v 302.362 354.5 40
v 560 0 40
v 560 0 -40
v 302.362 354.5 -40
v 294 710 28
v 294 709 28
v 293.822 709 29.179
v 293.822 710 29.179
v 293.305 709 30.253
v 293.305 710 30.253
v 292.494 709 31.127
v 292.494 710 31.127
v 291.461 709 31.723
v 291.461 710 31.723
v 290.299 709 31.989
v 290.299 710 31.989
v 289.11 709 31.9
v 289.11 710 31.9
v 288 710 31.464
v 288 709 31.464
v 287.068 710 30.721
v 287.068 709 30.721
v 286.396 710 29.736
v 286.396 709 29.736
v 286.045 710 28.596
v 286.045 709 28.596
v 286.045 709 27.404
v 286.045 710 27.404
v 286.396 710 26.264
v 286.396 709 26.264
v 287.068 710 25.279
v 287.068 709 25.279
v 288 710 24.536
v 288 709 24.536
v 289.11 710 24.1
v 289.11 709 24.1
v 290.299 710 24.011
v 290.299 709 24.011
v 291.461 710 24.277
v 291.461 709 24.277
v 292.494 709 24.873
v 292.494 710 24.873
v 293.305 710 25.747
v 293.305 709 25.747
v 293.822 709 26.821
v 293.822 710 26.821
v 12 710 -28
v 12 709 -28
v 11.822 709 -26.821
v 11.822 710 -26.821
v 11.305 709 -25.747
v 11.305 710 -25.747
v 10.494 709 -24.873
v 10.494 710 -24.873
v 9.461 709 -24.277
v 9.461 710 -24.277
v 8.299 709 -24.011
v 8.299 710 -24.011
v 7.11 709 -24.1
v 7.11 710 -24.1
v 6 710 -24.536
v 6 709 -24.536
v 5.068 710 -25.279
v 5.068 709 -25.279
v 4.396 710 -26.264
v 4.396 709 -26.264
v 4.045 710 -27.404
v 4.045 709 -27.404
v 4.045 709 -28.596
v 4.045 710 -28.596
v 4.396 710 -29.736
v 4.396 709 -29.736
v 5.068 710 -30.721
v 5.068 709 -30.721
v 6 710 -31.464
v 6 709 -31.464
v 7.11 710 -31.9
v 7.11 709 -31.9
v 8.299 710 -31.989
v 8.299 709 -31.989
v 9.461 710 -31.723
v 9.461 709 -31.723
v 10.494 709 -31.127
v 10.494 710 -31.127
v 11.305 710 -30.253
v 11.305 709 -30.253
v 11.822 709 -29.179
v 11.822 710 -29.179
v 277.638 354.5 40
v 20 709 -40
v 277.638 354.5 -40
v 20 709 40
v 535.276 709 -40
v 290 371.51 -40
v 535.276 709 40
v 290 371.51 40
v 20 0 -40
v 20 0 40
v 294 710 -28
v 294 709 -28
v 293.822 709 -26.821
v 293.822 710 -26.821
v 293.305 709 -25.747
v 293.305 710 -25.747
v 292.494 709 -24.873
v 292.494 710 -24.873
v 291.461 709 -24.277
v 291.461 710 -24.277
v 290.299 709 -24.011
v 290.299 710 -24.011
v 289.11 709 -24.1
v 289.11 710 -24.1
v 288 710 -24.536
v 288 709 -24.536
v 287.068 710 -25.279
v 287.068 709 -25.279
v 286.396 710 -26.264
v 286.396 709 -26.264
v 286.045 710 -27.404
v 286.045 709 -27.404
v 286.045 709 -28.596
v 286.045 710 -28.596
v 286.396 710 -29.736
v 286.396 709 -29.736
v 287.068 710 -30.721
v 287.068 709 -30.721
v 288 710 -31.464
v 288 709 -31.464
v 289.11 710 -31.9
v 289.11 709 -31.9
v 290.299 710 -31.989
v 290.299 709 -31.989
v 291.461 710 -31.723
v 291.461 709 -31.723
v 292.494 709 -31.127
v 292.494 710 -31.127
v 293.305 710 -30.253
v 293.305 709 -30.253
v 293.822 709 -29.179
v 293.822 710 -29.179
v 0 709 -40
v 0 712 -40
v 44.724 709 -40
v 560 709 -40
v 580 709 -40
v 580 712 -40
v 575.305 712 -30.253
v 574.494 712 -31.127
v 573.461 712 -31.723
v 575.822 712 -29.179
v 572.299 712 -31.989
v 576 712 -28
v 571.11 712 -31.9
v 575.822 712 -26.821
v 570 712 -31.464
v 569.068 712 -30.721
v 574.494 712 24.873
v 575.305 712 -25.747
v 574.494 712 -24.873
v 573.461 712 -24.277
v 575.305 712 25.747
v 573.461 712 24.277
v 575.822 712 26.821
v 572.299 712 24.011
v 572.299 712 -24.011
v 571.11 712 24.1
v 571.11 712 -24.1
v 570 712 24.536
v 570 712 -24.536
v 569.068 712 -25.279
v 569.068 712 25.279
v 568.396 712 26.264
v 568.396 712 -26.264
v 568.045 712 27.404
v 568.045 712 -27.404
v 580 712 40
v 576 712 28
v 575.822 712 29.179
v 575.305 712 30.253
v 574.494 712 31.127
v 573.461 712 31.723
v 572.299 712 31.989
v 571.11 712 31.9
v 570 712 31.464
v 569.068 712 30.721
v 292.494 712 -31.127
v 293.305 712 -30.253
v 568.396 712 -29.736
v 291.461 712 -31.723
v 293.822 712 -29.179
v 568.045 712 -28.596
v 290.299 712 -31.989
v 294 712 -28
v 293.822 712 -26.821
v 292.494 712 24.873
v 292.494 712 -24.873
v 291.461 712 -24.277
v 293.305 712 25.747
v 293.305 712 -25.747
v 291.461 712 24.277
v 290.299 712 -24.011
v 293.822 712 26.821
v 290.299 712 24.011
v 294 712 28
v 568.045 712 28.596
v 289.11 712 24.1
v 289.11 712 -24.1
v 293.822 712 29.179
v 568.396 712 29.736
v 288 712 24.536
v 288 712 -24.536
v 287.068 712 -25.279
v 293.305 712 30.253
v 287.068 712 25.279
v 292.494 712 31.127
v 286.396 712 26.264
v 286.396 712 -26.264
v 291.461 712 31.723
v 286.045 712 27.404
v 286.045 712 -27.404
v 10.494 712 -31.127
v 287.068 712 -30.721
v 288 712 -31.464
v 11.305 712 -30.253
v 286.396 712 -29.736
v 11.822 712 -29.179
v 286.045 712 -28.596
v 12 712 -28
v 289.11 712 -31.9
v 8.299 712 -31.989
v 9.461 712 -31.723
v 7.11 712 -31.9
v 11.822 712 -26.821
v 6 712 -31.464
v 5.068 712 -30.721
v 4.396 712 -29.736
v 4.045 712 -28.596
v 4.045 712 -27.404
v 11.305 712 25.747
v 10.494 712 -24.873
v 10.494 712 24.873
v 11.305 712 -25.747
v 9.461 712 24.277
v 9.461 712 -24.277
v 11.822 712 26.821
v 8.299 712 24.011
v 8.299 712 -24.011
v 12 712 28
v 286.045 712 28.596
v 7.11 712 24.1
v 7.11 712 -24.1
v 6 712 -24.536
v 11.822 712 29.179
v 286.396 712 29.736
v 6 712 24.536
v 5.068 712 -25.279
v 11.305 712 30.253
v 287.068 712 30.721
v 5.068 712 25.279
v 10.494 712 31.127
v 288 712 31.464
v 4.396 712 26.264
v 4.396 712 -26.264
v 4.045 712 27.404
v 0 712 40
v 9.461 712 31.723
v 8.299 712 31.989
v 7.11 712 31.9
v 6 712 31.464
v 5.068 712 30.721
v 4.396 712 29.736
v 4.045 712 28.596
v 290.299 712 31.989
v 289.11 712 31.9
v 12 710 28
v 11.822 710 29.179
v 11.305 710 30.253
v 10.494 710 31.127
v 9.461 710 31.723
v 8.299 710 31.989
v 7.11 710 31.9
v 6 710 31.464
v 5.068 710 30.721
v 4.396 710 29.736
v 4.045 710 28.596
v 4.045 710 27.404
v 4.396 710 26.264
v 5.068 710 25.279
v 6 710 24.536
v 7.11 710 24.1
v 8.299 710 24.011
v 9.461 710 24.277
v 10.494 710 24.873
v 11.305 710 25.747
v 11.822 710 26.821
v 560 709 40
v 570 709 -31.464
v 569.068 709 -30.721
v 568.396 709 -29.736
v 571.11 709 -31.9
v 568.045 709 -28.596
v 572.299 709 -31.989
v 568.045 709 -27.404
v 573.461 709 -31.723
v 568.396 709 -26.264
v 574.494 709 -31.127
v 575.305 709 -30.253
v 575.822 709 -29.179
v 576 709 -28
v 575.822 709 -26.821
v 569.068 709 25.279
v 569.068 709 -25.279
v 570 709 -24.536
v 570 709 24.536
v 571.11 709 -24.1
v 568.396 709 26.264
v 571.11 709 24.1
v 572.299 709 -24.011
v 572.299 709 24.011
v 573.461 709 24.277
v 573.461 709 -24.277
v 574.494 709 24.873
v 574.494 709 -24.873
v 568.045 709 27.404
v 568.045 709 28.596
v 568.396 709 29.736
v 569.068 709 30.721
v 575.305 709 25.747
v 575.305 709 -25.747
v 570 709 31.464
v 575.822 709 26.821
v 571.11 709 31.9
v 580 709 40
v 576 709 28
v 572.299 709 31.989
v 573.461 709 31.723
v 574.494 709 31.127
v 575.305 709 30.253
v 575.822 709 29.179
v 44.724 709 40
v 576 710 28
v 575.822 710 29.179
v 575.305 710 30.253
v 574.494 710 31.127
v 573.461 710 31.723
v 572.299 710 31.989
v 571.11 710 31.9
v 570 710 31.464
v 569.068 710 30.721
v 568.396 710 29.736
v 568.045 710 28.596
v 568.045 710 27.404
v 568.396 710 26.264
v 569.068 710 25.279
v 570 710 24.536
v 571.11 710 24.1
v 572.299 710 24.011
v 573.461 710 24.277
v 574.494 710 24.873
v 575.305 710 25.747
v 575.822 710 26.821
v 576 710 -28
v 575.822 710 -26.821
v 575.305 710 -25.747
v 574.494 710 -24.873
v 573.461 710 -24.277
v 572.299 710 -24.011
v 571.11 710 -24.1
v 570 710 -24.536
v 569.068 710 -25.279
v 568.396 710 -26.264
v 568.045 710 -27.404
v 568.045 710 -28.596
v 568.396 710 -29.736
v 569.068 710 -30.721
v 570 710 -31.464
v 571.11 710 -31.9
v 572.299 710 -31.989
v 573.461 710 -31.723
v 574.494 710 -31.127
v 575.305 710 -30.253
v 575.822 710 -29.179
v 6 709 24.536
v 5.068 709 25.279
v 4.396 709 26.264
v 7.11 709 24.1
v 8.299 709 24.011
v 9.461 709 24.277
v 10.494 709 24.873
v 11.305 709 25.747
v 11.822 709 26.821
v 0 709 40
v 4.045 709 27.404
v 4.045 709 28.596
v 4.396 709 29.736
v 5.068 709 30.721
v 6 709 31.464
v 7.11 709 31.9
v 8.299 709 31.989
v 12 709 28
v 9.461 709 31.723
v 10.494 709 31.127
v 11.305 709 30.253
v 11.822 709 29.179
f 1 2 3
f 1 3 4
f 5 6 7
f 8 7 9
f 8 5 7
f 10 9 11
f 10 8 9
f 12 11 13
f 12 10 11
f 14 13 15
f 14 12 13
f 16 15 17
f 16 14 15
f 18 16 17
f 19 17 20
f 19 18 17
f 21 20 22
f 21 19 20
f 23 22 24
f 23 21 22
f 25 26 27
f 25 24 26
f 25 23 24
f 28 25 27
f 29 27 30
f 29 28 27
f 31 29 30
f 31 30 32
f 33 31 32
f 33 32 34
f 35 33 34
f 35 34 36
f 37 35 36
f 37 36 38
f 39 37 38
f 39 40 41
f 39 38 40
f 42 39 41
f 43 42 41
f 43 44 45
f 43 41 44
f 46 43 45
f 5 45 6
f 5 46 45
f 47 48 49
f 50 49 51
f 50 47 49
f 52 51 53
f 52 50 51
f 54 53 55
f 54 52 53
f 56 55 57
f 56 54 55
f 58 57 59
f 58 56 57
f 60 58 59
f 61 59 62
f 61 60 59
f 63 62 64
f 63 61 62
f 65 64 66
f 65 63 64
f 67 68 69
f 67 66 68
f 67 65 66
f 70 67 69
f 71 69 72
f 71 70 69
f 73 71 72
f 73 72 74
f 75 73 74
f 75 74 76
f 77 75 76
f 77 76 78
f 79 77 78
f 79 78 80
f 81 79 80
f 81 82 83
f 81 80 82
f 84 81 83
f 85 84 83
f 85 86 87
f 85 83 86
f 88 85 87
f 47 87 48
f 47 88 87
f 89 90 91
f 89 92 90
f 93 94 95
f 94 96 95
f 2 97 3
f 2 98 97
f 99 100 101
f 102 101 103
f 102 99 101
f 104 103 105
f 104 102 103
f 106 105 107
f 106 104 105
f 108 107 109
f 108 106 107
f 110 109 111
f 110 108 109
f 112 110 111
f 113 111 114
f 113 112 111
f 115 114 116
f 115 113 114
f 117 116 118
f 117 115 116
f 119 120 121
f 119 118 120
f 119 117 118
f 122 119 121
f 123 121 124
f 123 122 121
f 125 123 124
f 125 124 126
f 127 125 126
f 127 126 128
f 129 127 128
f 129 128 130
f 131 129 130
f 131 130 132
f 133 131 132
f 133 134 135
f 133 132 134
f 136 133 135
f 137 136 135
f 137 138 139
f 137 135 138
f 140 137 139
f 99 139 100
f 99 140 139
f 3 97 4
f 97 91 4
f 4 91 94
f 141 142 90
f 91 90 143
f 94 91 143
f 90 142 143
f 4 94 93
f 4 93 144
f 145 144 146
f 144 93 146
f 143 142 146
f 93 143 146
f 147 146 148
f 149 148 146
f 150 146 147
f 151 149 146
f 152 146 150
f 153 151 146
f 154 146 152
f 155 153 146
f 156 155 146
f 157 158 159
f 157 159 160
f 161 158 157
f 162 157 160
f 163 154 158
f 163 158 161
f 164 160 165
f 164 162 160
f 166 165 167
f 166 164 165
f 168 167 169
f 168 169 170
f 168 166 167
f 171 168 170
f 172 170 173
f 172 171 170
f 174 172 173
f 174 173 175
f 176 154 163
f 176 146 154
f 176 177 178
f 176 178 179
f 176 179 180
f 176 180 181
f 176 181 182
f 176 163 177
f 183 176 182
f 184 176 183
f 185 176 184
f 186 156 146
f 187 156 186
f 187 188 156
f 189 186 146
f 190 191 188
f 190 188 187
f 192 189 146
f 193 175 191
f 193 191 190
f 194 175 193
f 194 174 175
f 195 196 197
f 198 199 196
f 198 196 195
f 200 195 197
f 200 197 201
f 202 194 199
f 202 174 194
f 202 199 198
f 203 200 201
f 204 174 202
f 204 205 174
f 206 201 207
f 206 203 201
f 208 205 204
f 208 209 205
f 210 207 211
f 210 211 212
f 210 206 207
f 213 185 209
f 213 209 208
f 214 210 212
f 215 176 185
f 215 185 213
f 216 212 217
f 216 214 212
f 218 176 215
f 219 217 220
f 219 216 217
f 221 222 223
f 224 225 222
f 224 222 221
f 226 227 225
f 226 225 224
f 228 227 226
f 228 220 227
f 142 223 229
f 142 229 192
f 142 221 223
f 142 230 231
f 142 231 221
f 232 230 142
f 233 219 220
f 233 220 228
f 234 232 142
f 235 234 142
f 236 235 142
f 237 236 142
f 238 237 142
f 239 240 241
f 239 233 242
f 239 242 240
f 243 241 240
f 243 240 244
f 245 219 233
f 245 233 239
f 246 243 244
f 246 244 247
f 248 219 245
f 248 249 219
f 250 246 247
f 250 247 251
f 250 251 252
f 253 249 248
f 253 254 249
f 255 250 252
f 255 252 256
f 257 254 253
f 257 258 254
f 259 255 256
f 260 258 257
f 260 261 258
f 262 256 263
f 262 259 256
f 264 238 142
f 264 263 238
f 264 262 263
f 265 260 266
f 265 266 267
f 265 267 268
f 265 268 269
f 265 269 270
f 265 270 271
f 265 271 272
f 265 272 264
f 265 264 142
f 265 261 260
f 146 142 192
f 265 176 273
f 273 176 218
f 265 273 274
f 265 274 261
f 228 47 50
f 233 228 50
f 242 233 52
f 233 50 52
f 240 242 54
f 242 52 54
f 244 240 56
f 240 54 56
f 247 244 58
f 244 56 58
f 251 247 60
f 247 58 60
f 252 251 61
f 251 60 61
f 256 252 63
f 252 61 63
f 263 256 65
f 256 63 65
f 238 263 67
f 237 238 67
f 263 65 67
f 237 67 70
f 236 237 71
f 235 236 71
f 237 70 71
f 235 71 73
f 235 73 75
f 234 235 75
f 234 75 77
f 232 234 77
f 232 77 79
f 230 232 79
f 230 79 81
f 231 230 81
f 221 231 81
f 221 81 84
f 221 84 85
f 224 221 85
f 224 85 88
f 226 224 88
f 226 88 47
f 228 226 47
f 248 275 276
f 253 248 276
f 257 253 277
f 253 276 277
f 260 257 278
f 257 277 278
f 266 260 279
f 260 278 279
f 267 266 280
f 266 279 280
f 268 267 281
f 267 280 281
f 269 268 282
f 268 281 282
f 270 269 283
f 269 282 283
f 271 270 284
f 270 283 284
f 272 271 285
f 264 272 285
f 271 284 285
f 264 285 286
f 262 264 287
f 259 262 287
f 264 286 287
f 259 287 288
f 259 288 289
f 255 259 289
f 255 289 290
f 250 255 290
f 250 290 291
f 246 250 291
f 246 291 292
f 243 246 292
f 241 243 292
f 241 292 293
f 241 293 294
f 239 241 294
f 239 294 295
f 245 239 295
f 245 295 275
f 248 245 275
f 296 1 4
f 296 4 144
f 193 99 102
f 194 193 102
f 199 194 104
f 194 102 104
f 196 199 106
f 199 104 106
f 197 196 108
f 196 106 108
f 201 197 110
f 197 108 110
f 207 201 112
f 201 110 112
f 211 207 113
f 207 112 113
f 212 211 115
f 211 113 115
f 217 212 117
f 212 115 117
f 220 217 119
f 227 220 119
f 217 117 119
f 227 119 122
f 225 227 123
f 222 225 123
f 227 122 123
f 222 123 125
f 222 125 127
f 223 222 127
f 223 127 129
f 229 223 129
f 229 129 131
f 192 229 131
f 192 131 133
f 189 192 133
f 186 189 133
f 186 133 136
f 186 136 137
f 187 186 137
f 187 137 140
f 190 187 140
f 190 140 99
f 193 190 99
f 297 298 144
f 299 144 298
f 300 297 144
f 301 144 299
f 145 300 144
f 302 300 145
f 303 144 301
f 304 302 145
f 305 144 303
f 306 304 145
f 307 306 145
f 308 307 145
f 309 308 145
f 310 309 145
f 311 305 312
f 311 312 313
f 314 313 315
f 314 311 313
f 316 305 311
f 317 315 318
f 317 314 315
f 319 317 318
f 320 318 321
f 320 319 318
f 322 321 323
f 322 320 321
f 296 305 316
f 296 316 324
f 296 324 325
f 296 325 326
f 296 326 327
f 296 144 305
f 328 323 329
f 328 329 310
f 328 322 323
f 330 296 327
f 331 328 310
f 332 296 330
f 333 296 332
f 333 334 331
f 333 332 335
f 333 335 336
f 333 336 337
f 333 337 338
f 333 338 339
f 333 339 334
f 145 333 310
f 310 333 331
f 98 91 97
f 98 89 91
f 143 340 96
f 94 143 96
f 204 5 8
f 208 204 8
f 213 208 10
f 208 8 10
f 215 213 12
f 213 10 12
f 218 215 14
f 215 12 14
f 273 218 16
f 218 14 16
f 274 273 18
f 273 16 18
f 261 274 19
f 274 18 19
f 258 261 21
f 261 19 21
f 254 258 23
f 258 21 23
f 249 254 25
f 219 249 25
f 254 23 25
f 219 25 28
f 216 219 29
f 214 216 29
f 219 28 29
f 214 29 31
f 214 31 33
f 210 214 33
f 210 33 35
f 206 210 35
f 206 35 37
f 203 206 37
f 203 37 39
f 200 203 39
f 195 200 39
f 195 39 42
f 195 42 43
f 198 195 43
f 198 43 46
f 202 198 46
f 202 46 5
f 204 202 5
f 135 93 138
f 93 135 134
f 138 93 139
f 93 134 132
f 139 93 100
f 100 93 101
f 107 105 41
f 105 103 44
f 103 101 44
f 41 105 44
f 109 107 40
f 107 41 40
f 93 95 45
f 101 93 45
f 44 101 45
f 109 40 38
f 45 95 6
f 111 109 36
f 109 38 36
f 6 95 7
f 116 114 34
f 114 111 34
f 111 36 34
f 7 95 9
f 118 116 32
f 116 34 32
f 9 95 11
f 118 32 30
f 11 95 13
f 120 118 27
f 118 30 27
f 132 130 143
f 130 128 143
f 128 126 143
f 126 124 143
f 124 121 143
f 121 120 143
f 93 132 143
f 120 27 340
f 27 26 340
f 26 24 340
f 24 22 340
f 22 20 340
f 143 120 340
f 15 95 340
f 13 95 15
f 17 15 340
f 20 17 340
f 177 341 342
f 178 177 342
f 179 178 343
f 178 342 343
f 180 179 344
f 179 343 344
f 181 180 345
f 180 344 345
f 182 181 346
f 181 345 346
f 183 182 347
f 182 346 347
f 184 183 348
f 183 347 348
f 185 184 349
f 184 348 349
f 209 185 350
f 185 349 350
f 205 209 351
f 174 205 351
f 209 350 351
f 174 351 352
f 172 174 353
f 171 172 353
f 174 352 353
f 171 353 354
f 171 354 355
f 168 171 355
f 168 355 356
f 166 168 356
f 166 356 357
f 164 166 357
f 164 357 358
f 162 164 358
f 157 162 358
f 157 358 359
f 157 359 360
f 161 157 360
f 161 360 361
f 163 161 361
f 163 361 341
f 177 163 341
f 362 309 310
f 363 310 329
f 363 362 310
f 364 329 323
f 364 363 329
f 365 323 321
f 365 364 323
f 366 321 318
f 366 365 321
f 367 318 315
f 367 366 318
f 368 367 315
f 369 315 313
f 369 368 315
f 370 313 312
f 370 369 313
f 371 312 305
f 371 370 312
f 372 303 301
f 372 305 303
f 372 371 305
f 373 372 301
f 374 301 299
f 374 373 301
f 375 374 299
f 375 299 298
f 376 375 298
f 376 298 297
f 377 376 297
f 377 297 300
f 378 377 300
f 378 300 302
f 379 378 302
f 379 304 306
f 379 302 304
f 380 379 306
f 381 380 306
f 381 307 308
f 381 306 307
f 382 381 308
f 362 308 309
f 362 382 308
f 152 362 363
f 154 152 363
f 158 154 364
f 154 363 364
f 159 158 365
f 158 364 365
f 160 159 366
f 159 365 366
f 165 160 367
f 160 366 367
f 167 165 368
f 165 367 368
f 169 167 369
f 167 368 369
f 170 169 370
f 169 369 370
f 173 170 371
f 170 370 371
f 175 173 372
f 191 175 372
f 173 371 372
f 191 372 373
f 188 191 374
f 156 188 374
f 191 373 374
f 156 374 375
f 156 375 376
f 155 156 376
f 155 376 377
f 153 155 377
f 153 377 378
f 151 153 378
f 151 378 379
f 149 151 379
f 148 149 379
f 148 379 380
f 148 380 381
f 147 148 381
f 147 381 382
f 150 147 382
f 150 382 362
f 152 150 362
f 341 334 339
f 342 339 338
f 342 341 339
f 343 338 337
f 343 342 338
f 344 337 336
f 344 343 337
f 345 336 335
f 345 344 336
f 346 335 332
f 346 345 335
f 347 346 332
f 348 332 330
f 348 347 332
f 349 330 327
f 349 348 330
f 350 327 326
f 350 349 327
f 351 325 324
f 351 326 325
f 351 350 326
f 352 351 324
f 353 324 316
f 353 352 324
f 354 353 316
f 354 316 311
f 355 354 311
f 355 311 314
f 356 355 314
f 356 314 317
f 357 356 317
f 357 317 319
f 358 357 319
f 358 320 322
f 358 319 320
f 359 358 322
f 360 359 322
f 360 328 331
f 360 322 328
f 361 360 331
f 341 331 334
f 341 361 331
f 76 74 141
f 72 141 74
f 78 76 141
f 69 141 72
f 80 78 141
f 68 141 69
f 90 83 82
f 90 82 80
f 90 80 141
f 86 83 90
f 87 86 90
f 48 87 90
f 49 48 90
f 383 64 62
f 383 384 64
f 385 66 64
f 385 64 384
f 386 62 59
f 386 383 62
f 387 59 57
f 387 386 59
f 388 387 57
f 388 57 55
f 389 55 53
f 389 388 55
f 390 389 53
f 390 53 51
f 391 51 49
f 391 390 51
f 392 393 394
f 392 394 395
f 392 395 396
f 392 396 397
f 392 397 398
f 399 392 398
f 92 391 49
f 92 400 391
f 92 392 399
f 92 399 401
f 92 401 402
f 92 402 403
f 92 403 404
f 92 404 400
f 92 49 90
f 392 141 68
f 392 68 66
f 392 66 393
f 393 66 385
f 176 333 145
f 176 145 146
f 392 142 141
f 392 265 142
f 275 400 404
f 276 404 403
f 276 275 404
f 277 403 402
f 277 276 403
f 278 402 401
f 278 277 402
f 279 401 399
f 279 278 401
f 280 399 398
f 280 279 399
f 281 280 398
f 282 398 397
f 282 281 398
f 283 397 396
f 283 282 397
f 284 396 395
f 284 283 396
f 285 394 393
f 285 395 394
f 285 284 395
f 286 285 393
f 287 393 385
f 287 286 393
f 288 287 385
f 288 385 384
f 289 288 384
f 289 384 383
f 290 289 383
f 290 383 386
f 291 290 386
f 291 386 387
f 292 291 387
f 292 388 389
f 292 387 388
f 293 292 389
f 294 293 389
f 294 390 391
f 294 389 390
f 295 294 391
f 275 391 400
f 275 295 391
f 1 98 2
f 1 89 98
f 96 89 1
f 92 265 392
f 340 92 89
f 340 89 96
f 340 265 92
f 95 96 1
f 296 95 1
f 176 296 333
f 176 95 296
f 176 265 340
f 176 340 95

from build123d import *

# Parameters (mm, degrees)
PAD_DEPTH         = 40
SKETCH002_R       = 4
POCKET_DEPTH      = 5
POCKET_DEPTH_BACK = -5


with BuildPart() as part:
    # Sketch → Pad (new body, symmetric)
    with BuildSketch(Plane.XY):
        Polygon((20, 0), (560, 0), (302.361985, 354.5), (560, 709), (580, 709), (580, 712), (0, 712), (0, 709), (20, 709), (277.638015, 354.5), align=None)
        Polygon((44.723969, 709), (290, 371.509615), (535.276031, 709), align=None, mode=Mode.SUBTRACT)
    extrude(amount=PAD_DEPTH, both=True)

    # Sketch002 → Pocket (cut, two sides)
    with BuildSketch(Plane.XZ.offset(-710)) as pocket_sk:
        with Locations((8, 28)):
            Circle(SKETCH002_R)
        with Locations((290, 28)):
            Circle(SKETCH002_R)
        with Locations((572, 28)):
            Circle(SKETCH002_R)
        with Locations((572, -28)):
            Circle(SKETCH002_R)
        with Locations((290, -28)):
            Circle(SKETCH002_R)
        with Locations((8, -28)):
            Circle(SKETCH002_R)
    extrude(amount=-POCKET_DEPTH, mode=Mode.SUBTRACT)
    extrude(pocket_sk.sketch, amount=-POCKET_DEPTH_BACK, mode=Mode.SUBTRACT)


solid = part.part
